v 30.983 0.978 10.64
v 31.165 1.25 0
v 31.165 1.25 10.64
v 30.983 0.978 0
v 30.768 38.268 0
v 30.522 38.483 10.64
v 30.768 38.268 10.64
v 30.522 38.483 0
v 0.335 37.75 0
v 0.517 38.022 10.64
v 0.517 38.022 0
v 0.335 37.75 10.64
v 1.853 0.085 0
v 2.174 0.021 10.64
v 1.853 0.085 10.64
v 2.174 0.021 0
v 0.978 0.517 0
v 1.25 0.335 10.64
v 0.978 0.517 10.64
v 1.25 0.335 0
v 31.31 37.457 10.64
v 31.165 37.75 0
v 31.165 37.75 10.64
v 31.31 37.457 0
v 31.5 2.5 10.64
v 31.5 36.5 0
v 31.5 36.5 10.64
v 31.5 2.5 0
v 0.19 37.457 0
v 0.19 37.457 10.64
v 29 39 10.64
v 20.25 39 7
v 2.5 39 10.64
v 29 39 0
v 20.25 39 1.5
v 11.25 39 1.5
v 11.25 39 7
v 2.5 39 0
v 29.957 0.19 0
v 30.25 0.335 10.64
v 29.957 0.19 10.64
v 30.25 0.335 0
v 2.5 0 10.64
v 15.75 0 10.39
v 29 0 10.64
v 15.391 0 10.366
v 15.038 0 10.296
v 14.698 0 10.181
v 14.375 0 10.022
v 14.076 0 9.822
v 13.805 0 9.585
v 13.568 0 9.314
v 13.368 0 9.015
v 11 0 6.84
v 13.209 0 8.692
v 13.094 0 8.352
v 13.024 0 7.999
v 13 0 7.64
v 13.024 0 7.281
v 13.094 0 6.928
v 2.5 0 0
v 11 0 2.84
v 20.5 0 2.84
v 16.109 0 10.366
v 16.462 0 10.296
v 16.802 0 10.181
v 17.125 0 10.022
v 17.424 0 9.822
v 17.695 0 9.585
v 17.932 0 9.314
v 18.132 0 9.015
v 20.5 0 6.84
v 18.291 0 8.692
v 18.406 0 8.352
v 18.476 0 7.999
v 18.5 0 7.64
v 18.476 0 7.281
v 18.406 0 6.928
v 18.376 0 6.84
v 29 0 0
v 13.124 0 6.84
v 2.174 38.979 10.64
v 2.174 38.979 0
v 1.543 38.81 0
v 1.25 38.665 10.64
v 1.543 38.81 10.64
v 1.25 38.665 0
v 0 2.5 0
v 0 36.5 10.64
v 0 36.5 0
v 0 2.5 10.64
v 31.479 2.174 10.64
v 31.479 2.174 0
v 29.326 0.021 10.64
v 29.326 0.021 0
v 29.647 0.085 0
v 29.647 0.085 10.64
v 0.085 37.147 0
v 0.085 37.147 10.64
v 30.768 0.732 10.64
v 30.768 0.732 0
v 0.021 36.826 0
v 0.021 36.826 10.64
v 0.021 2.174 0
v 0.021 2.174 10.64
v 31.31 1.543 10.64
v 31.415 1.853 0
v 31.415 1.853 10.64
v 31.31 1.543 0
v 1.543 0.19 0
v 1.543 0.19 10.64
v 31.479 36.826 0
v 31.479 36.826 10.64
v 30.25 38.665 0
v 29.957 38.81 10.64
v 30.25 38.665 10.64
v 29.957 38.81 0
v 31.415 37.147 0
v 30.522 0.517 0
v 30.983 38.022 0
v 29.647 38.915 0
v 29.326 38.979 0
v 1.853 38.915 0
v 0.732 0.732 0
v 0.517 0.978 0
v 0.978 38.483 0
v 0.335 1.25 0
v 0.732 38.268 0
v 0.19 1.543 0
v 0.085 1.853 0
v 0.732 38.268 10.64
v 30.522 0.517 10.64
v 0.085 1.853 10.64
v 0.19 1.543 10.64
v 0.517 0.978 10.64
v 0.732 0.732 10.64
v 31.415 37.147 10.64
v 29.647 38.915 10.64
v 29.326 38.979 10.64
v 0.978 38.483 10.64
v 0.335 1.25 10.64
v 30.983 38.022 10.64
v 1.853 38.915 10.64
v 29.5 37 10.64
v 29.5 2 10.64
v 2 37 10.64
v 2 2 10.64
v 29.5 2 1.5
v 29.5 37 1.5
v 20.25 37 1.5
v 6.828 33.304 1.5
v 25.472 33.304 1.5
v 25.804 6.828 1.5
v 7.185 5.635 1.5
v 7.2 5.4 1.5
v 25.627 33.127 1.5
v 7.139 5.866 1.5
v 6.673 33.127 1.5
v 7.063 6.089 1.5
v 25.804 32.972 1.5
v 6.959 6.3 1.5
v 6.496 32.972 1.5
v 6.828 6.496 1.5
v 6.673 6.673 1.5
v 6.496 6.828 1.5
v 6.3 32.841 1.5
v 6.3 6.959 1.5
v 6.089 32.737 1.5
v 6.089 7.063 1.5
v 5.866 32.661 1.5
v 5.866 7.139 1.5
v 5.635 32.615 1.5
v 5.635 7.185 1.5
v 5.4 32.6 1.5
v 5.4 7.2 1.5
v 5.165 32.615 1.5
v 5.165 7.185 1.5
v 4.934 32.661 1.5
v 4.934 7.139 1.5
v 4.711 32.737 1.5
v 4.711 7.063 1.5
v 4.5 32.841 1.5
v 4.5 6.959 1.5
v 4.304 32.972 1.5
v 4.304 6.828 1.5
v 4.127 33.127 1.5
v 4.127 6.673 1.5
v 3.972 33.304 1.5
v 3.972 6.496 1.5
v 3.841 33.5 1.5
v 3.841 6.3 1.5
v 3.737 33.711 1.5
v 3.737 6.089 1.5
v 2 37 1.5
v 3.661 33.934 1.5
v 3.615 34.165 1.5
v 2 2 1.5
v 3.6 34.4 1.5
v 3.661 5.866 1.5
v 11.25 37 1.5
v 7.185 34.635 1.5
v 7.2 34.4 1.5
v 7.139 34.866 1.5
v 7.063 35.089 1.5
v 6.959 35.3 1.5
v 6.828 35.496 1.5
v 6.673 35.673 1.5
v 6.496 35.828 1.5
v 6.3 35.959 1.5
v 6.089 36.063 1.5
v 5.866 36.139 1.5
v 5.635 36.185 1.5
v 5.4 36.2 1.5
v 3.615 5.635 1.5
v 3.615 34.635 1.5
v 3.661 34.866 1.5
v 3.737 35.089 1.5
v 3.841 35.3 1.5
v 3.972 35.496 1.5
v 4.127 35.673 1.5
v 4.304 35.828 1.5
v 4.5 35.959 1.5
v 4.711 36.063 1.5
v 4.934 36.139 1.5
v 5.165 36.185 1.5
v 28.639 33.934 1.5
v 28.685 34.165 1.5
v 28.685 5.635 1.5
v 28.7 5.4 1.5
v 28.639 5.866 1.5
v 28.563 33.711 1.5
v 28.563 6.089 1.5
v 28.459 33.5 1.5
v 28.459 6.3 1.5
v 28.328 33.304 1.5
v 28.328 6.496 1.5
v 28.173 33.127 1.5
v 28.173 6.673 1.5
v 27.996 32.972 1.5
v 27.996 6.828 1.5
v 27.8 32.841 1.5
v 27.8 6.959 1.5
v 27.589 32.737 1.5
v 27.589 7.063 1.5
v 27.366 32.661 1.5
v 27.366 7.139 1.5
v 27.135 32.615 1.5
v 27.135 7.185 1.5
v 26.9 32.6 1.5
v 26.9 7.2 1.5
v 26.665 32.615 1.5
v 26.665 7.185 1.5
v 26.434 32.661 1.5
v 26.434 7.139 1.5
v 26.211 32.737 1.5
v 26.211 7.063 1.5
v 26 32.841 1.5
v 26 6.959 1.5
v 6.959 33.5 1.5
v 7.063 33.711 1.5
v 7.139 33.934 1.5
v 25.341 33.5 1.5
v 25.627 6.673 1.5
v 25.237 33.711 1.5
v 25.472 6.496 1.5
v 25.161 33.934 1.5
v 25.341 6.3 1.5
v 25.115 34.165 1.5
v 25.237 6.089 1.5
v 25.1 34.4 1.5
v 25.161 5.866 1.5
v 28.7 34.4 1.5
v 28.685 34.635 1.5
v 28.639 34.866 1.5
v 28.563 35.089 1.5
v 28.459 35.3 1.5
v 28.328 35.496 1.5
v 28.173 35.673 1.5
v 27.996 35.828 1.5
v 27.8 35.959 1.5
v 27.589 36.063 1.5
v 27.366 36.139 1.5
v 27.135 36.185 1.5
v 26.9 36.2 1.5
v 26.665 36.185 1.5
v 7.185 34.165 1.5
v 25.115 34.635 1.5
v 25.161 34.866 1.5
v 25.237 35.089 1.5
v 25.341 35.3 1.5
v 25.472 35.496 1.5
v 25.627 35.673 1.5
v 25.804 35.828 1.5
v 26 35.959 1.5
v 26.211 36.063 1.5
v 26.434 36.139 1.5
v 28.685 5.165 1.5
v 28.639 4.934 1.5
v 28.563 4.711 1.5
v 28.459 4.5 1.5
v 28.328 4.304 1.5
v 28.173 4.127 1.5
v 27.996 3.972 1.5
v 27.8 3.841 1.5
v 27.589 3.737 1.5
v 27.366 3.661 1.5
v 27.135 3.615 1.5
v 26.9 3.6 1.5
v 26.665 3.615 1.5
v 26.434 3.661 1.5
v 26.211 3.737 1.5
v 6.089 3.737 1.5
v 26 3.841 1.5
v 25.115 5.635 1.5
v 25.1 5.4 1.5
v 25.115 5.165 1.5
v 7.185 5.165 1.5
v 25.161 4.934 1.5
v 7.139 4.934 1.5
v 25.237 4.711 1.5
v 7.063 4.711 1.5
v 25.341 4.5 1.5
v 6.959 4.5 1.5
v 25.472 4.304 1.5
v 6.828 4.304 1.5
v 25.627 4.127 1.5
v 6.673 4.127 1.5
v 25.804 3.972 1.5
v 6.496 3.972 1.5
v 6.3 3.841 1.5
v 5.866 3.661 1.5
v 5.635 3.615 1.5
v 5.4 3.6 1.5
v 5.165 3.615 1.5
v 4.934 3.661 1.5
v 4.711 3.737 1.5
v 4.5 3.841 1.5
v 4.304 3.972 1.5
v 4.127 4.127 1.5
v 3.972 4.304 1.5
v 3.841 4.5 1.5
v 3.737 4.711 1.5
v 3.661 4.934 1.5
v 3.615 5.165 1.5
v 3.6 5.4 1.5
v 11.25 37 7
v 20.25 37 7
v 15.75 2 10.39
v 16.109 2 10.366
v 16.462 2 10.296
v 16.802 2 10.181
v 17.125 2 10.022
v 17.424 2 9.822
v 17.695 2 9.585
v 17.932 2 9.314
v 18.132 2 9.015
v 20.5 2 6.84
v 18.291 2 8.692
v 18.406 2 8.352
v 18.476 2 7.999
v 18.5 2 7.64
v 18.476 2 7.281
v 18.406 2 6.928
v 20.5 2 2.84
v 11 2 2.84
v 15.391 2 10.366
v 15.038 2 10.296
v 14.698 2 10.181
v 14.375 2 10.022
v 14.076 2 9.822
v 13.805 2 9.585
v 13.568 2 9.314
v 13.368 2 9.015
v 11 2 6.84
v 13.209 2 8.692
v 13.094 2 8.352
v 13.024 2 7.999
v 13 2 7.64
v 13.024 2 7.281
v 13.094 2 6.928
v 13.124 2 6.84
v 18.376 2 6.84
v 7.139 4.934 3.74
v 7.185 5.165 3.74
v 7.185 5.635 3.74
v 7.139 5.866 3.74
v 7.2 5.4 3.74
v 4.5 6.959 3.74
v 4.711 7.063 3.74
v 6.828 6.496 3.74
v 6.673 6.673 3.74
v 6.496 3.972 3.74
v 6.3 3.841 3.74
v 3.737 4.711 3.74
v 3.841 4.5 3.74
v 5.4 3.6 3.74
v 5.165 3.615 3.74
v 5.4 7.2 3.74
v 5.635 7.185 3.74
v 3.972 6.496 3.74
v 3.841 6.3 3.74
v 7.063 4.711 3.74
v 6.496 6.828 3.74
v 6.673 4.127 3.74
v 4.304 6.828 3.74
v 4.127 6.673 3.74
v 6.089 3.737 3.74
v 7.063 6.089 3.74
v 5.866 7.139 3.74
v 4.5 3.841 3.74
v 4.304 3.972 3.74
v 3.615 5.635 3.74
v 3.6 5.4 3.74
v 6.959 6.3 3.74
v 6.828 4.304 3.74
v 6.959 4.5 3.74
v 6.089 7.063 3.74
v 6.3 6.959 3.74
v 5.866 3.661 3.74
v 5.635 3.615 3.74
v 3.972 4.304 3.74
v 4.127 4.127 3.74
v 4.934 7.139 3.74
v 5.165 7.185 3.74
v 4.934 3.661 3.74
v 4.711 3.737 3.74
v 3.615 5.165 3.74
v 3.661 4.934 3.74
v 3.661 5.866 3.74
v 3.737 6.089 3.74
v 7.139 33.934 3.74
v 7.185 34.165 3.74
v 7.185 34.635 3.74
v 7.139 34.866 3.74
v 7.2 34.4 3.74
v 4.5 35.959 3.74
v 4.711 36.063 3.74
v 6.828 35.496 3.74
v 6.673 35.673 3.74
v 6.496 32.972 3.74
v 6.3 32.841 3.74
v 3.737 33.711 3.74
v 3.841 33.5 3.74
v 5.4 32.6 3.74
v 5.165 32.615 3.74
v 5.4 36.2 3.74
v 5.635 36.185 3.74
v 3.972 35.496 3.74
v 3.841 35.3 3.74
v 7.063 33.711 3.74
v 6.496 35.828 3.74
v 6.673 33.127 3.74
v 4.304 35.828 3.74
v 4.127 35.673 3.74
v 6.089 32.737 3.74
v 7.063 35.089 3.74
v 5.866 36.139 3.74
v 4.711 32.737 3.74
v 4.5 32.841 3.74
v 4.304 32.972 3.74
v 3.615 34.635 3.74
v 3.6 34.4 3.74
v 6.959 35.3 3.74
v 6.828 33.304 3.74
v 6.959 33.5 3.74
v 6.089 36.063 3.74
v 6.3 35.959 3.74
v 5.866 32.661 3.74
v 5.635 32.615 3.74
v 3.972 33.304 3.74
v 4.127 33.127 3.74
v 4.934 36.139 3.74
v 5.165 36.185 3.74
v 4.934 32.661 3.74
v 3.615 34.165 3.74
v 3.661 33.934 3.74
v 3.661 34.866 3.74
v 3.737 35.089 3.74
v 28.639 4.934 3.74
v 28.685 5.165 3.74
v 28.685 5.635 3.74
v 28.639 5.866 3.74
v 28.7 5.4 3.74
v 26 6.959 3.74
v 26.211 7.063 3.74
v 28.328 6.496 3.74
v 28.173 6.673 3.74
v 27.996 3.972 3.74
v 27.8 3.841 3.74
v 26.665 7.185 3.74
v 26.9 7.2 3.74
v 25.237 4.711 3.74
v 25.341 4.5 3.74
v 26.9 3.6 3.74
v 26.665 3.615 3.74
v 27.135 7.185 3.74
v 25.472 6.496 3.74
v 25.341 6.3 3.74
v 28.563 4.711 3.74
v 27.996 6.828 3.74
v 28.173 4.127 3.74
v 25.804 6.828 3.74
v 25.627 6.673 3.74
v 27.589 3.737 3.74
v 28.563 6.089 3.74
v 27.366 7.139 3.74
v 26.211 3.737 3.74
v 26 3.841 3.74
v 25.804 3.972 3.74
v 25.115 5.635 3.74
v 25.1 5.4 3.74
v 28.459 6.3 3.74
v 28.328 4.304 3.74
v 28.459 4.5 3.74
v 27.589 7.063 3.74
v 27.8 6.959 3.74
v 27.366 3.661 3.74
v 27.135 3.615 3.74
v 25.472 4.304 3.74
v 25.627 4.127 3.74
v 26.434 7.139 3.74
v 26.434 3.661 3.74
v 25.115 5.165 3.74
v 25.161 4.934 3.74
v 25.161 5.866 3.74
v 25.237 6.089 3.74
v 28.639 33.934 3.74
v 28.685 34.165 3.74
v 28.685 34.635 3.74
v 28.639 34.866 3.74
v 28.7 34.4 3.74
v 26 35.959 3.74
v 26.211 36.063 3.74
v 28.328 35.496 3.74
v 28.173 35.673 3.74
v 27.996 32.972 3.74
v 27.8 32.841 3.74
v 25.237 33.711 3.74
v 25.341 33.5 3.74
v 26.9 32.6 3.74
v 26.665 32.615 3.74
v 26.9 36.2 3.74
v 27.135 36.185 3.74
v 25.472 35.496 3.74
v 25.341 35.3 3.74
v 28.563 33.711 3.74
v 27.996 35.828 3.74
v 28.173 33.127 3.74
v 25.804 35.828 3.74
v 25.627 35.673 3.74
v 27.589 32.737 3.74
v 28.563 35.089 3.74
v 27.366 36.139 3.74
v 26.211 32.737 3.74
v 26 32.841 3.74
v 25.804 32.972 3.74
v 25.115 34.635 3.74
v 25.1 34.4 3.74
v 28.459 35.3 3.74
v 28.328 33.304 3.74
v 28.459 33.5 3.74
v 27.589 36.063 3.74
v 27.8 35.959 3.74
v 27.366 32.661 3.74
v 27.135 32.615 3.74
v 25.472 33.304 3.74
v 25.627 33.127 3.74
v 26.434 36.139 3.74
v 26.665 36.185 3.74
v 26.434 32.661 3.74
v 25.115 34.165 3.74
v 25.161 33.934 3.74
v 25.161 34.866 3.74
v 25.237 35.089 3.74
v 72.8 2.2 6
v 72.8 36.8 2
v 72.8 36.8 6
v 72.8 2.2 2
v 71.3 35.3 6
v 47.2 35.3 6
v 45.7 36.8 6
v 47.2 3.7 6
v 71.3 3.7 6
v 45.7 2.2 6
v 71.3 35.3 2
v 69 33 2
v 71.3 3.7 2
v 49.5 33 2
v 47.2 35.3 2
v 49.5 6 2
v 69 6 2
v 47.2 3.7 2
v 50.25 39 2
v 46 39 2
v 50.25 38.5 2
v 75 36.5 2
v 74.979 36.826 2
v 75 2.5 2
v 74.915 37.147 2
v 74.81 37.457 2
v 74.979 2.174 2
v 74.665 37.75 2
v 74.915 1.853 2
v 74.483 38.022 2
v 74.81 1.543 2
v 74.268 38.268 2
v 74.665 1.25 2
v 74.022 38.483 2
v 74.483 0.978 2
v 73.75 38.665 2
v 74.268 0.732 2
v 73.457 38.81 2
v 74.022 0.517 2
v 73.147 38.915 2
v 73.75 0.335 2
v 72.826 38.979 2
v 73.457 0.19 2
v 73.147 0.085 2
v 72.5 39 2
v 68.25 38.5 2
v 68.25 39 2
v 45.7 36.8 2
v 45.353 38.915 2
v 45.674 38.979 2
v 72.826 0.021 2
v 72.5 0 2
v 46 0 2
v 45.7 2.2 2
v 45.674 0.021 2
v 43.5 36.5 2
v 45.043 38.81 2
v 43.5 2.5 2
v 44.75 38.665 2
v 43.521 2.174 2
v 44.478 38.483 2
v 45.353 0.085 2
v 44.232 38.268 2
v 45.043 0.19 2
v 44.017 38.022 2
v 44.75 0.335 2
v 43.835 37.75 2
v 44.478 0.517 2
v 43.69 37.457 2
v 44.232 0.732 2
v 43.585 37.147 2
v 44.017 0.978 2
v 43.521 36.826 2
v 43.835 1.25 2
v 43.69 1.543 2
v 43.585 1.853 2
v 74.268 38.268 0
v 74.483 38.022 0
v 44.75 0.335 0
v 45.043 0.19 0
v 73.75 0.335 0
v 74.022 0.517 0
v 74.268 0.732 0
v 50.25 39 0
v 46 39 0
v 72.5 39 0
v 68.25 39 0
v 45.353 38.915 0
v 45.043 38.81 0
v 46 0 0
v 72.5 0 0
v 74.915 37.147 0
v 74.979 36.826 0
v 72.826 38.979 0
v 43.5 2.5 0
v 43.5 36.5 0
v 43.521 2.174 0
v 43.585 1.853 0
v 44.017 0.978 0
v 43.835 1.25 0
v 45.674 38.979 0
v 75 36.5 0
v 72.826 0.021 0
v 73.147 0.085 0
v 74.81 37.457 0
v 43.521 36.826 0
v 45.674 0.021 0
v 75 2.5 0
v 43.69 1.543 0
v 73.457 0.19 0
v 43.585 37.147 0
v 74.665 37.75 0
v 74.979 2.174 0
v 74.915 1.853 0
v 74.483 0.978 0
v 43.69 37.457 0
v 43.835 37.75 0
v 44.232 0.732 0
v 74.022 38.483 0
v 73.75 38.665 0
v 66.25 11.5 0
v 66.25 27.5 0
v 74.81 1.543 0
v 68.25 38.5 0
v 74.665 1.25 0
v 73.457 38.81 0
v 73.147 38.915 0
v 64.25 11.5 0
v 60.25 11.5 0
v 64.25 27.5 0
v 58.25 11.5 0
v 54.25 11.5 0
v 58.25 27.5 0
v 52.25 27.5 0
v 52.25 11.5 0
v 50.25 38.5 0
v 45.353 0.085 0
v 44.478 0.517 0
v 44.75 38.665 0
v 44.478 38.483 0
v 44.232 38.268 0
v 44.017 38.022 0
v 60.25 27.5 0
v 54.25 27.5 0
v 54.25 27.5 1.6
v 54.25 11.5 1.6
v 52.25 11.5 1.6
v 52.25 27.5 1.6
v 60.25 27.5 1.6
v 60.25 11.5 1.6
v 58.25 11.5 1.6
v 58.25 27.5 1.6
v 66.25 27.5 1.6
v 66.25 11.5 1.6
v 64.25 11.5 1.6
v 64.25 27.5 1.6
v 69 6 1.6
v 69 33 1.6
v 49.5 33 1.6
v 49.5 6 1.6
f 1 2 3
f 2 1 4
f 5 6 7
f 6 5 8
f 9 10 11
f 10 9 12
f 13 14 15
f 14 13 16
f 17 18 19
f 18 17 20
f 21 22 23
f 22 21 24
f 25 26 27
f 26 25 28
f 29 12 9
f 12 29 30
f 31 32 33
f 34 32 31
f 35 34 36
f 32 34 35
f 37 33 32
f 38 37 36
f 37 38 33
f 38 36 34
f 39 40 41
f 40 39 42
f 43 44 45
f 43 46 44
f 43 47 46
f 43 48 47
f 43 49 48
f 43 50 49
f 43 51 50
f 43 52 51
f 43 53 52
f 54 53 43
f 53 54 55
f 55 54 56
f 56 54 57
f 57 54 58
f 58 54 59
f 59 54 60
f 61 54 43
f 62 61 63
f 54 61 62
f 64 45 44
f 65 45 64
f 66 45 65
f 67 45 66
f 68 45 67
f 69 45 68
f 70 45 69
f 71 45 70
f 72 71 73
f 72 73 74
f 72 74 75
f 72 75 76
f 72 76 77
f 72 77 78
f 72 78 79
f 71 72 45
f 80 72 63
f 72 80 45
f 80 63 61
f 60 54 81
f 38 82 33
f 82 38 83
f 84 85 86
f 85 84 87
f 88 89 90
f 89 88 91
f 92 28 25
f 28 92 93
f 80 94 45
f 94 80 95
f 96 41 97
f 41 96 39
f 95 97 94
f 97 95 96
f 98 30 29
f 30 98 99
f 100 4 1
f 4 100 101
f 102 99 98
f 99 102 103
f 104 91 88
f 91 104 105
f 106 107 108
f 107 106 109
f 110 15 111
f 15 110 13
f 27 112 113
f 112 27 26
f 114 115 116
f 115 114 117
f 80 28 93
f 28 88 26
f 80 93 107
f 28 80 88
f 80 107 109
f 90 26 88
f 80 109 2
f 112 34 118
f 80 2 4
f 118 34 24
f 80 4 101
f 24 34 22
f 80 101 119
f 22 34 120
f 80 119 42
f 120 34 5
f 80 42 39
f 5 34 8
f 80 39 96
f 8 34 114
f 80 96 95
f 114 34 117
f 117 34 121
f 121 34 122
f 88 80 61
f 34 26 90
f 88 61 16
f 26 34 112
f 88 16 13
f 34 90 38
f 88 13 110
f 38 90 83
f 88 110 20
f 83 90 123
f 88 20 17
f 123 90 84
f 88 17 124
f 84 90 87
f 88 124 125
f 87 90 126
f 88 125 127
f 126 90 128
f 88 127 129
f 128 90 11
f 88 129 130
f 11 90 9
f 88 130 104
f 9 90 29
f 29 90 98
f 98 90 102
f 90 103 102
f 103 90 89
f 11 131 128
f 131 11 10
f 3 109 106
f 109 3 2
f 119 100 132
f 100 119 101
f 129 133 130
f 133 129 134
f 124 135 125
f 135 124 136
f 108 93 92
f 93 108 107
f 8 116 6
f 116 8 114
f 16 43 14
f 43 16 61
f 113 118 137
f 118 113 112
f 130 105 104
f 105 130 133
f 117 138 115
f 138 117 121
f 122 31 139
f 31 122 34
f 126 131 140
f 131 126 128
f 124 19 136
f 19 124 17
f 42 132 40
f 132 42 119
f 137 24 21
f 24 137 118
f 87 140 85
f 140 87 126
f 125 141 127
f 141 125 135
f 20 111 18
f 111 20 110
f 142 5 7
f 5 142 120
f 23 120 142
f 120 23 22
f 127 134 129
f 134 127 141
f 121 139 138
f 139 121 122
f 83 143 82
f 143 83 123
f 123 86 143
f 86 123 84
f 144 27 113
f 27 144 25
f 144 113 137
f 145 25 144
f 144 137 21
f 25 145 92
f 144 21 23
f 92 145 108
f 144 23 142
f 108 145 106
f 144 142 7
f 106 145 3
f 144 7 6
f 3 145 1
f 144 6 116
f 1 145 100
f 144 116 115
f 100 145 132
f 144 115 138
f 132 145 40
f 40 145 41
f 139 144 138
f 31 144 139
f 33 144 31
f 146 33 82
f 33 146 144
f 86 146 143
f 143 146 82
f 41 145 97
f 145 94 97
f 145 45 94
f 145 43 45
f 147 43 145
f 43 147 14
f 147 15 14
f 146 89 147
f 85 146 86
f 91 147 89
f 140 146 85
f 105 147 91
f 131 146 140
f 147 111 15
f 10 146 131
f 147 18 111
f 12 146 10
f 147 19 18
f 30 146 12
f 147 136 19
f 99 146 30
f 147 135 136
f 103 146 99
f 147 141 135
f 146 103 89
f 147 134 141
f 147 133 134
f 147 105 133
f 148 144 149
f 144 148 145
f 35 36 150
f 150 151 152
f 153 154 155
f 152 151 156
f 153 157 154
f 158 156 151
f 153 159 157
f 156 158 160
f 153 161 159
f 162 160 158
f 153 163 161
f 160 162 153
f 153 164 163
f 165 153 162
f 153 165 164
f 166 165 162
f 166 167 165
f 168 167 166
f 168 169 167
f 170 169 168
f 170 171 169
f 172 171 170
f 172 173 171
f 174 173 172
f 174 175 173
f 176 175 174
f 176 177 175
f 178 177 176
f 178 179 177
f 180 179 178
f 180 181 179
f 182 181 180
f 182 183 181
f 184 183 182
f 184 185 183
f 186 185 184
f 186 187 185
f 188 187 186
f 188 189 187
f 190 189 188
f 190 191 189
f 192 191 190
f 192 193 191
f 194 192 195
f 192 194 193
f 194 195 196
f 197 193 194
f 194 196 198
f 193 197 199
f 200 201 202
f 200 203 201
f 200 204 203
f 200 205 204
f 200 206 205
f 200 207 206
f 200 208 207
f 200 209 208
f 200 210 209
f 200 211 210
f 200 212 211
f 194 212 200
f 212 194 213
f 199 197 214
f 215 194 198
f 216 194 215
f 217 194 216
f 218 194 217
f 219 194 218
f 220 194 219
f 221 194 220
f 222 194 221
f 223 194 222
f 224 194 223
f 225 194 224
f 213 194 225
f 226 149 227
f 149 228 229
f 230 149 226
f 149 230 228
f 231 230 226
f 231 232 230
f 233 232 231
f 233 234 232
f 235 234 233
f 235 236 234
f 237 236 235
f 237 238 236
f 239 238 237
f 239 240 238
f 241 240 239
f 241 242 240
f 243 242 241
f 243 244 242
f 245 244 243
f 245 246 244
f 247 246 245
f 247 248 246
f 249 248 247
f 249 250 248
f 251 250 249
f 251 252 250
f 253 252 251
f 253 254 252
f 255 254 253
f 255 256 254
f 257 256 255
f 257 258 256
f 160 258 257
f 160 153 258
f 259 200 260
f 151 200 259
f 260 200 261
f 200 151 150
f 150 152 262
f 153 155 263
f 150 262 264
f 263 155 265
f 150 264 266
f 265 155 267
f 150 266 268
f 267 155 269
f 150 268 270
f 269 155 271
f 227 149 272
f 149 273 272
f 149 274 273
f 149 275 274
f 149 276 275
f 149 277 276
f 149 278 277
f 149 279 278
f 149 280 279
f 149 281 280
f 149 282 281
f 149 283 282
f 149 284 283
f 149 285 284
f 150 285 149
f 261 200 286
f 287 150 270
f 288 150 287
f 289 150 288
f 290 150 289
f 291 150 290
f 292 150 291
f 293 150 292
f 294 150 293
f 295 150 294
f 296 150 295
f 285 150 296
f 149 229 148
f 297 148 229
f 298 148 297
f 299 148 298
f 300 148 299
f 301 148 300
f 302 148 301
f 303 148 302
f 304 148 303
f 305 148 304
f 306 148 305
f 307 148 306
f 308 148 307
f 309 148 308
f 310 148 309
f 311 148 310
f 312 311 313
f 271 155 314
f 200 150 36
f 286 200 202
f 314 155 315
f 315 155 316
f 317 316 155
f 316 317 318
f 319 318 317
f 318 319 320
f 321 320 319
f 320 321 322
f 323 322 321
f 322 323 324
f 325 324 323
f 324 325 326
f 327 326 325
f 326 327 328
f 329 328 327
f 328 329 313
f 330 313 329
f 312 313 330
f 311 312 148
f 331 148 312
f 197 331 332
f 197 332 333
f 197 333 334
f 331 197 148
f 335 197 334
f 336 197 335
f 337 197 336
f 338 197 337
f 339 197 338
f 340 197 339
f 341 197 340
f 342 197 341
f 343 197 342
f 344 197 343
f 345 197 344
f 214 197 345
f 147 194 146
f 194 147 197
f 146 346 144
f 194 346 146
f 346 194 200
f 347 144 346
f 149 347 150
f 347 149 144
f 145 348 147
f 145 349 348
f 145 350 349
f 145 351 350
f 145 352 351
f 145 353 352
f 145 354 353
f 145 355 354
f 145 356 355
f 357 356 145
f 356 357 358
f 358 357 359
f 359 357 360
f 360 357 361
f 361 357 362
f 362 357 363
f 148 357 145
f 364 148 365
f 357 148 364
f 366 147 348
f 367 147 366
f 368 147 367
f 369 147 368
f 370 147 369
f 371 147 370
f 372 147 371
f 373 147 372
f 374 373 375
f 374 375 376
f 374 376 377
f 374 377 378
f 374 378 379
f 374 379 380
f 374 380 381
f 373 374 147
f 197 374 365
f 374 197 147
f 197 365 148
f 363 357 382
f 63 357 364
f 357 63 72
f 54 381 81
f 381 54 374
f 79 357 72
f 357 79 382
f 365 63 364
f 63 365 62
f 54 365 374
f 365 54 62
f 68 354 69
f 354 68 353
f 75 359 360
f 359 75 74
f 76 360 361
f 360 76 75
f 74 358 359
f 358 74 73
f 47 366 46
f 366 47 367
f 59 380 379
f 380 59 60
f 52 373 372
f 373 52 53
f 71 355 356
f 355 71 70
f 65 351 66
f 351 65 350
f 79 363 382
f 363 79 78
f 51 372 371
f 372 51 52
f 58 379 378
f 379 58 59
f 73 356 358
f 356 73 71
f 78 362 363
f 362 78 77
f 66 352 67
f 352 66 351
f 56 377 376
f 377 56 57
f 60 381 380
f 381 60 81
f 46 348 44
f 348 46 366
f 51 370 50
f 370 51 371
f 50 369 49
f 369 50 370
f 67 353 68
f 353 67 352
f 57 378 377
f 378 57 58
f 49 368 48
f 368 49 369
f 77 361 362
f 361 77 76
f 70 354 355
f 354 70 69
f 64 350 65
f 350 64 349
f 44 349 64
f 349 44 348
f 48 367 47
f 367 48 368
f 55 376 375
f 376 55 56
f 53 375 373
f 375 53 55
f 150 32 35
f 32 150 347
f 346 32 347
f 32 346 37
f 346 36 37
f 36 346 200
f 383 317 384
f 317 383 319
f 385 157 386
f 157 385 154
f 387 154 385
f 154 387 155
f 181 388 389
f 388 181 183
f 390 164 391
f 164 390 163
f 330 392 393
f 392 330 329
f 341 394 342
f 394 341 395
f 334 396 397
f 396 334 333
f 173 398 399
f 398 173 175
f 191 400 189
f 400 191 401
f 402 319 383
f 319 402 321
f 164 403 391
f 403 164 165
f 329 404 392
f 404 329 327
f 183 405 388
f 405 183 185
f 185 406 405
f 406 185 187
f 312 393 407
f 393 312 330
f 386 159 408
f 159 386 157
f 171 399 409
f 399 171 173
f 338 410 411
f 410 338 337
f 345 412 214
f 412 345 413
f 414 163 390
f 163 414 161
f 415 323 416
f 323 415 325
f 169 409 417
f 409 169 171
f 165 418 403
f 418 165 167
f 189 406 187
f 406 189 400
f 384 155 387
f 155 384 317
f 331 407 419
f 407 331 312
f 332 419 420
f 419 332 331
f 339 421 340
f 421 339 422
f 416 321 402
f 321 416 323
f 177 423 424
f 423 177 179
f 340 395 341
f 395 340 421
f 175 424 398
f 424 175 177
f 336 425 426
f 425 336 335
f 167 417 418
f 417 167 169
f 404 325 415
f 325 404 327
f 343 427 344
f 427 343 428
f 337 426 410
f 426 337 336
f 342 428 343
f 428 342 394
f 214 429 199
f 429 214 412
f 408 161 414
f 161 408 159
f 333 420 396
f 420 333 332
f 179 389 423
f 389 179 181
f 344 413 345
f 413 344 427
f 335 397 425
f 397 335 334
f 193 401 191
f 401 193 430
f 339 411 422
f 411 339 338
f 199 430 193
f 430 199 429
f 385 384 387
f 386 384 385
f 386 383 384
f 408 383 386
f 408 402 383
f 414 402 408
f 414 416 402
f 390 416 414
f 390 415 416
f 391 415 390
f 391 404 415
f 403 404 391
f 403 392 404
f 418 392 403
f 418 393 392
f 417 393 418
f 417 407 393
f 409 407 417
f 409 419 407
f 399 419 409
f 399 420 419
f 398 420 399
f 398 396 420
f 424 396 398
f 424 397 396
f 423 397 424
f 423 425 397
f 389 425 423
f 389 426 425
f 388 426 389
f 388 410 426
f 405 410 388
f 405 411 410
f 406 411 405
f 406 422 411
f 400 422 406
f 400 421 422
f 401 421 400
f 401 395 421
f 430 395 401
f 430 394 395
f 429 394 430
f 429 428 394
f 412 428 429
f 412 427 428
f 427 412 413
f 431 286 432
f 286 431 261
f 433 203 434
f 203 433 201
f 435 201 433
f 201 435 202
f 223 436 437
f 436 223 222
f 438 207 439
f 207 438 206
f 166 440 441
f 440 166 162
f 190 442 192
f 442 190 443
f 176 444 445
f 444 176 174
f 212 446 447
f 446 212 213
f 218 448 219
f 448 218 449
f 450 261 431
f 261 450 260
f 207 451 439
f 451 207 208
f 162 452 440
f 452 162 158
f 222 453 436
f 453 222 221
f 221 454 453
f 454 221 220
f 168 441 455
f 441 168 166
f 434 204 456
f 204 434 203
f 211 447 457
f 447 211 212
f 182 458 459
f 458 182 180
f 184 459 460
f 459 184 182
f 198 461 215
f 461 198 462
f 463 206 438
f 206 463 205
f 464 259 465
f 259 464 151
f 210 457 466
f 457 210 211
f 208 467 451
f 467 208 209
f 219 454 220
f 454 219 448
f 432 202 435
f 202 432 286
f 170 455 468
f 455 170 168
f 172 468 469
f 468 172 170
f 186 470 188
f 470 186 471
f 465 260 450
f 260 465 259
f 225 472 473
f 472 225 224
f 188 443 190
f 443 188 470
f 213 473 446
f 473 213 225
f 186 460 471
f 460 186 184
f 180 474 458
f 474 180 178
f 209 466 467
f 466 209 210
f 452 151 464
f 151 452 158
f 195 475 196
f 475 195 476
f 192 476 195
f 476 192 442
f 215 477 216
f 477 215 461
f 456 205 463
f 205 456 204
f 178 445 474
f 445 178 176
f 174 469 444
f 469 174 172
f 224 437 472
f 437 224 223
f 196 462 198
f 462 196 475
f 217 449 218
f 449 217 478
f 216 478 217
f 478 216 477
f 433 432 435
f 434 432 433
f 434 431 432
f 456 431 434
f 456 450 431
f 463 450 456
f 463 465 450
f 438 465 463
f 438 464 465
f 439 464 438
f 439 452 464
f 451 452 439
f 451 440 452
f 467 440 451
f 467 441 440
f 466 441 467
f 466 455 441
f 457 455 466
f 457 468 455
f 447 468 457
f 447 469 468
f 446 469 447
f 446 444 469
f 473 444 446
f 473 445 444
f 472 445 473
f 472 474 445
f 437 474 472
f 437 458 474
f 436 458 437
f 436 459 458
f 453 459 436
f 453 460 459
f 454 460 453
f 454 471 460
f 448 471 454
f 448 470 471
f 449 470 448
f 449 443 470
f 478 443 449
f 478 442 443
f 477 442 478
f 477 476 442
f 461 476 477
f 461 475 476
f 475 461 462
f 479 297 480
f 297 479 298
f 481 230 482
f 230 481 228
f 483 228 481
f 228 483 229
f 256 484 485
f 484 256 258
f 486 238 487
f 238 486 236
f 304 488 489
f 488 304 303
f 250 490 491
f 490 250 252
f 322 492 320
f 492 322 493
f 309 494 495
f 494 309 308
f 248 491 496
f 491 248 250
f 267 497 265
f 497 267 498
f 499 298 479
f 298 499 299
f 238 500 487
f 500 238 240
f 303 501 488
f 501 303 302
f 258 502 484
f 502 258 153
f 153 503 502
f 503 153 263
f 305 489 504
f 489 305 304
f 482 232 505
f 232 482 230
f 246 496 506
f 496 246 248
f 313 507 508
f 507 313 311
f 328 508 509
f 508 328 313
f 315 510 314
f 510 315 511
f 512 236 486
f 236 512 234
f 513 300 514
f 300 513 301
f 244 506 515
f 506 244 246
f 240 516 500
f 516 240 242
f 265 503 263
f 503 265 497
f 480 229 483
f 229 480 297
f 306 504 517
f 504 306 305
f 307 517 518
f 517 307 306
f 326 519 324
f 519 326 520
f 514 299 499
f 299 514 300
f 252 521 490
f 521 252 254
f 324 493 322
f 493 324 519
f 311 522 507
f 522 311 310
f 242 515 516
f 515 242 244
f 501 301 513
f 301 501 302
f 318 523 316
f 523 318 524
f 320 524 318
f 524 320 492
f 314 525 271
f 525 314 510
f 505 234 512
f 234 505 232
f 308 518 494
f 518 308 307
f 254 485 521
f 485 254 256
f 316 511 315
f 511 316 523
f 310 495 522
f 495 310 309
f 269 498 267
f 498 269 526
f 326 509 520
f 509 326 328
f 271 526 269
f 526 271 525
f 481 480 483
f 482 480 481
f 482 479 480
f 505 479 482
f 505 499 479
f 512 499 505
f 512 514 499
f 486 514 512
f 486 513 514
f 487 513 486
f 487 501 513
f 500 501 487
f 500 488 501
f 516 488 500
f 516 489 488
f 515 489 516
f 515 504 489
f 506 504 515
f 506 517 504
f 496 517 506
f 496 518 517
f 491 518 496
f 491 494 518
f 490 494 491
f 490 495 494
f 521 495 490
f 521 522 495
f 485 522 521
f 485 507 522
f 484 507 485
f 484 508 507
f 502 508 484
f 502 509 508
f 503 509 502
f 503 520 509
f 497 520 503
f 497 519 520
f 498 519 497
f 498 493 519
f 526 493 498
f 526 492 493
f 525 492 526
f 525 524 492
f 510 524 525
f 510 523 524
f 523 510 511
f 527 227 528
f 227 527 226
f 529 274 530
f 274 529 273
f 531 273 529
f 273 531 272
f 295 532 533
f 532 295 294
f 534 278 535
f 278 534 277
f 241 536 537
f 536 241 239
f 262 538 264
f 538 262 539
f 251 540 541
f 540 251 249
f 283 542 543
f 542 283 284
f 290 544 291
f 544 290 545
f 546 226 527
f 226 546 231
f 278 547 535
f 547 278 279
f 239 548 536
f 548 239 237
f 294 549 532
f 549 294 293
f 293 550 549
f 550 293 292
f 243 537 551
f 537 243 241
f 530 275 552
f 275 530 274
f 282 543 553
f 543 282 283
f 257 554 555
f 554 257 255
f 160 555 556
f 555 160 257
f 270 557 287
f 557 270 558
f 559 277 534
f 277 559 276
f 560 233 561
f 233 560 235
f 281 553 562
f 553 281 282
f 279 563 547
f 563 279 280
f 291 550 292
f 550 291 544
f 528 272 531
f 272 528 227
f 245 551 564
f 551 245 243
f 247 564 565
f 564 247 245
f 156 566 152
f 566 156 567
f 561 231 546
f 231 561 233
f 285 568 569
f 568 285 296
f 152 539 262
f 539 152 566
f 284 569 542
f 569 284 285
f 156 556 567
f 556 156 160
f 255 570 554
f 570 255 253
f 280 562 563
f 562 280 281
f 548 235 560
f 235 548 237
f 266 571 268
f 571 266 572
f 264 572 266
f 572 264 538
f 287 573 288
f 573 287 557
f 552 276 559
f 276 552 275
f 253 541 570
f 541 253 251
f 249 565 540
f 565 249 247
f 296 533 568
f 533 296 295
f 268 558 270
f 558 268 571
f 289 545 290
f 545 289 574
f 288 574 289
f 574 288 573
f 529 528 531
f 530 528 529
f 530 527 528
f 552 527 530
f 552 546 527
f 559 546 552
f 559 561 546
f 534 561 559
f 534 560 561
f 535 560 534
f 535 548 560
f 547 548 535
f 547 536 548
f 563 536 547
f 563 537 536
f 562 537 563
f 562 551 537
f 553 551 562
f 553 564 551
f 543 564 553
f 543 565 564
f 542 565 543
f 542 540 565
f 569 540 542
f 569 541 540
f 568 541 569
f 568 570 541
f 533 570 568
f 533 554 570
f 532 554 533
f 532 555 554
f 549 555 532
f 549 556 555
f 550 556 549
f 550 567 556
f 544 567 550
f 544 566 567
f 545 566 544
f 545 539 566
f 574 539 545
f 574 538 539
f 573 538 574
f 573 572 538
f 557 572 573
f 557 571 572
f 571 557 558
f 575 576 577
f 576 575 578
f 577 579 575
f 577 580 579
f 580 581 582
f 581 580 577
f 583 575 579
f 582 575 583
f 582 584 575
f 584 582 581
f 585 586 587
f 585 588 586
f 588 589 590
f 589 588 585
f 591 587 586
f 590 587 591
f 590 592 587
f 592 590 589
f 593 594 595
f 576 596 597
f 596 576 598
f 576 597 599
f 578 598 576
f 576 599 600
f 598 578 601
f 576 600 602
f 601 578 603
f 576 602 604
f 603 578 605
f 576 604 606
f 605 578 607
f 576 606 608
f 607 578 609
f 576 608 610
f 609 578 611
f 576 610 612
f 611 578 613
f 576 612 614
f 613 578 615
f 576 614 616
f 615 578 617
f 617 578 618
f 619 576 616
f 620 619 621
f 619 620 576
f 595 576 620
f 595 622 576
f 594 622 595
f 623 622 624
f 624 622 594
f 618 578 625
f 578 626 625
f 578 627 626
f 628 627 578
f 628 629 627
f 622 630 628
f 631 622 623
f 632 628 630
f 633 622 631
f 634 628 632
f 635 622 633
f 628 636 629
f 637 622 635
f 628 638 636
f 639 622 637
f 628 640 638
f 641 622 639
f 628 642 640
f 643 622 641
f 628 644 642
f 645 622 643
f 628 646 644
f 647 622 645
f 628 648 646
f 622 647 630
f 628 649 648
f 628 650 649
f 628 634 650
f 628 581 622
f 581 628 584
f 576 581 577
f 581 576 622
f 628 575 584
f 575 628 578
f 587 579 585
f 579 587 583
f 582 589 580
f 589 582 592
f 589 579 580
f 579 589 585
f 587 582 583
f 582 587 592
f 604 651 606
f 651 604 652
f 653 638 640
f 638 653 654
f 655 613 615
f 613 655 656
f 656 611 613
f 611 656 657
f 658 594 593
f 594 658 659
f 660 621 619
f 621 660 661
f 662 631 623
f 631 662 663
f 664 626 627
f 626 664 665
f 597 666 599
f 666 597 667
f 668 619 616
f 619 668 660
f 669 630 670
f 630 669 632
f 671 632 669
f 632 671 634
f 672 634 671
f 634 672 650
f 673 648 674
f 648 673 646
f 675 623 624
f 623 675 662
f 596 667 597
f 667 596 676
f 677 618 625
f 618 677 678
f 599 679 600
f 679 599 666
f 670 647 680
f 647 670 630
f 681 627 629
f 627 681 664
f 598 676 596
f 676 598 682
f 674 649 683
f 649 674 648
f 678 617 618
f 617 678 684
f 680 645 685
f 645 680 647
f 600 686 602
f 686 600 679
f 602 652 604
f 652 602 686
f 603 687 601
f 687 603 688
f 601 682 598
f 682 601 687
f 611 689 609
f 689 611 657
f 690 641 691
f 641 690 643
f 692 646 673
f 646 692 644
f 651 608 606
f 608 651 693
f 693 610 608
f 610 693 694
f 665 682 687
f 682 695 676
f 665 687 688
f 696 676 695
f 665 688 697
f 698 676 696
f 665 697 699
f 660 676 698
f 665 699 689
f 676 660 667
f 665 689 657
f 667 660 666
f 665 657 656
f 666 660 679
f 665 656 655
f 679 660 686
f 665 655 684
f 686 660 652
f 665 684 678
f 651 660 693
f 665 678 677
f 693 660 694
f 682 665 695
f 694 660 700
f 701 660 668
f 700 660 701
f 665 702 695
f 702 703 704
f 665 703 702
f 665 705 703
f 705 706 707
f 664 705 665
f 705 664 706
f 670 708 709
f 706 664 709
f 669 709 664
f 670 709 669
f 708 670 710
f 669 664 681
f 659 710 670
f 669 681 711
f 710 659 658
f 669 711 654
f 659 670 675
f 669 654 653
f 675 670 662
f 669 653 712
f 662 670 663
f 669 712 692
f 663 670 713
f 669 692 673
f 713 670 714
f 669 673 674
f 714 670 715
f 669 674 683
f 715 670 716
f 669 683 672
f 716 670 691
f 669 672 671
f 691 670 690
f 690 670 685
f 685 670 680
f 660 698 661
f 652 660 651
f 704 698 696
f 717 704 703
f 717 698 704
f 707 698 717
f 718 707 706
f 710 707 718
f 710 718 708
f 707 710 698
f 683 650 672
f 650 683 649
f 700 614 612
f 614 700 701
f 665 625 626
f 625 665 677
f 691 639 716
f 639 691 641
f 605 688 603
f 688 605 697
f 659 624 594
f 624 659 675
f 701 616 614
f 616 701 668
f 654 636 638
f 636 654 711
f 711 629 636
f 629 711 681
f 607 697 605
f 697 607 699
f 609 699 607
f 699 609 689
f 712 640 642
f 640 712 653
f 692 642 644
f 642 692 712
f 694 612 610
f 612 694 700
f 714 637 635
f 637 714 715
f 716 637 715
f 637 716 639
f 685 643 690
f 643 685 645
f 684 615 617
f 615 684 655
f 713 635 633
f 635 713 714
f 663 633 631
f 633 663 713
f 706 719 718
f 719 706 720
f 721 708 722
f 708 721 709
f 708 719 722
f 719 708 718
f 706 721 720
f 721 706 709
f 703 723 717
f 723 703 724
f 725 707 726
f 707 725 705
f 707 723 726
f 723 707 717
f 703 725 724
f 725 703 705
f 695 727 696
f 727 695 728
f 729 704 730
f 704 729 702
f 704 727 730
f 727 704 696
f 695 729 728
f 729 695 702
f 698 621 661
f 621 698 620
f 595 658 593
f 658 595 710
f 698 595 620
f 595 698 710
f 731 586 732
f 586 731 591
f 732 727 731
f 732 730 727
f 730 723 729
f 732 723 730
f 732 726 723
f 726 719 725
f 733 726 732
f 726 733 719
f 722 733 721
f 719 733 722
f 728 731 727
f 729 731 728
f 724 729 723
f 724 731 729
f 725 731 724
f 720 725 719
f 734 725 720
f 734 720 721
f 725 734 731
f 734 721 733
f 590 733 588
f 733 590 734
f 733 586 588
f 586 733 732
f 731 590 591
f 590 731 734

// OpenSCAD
// =============================================================================
//  PixMob IR Controller — Gehäuse
//  Wemos D1 Mini (USB Type-C) + KY-005 IR-Sender
//
//  Zweiteiler: Tray (Unterteil) + Lid (Deckel, Reibschluss)
//  Druckbar OHNE Stützen — beide Teile flach auf Druckbett
//
//  Vorderseite (Y=0):
//    [unten] USB Type-C Buchse
//    [oben]  IR-LED Loch (5 mm LED bündig einpressen)
//
//  Kabelkanal (Rückseite Y=ol):
//    Für KY-005 Anschlussleitungen (S / VCC / GND)
//
//  Druck-Empfehlung:
//    Material : PETG oder PLA
//    Schicht  : 0.2 mm
//    Füllung  : 20 %
//    Wände    : 3
// =============================================================================

/* [1 — Platinen-Maße  D1 Mini] */
bw      = 26.7;   // Breite  [mm]
bl      = 34.2;   // Länge   [mm]
bt      = 1.6;    // PCB-Dicke
pin_h   = 2.54;   // Pin-Header Höhe unter PCB
comp_h  = 3.5;    // Bauteil-Höhe über PCB (ESP8266-Modul ≈ 3 mm)

/* [2 — USB Type-C Ausschnitt] */
usb_w   = 9.5;    // Breite  (Type-C Standard 8.94 + 0.6 Spiel)
usb_h   = 4.0;    // Höhe    (Type-C Standard 3.26 + 0.7 Spiel)

/* [3 — IR-LED Loch (Vorderwand)] */
ir_d    = 5.5;    // Durchmesser (5 mm LED-Körper + 0.5 Presspassung)

/* [4 — KY-005 Kabelkanal (Rückwand)] */
cable_w = 9.0;
cable_h = 5.5;

/* [5 — Gehäuse] */
wall    = 2.0;    // Wandstärke
floor_t = 1.5;    // Bodenstärke
gap     = 0.4;    // Spiel Board ↔ Wand (rundum)
box_r   = 2.5;    // Eckabrundungsradius

/* [6 — Deckel (Reibschluss)] */
lid_t   = 2.0;    // Deckelplatten-Stärke
rim_h   = 4.0;    // Krempen-Höhe (steckt in Tray)
rim_w   = 1.5;    // Krempen-Wandstärke
fit     = 0.20;   // Reibschluss-Spiel (reduzieren → straffer, erhöhen → lockerer)

/* [7 — Render-Qualität] */
$fn     = 48;


// =============================================================================
// Berechnete Maße (nicht ändern)
// =============================================================================
iw   = bw + 2*gap;                          // Innenbreite
il   = bl + 2*gap;                          // Innenlänge
ih   = pin_h + bt + comp_h + 1.5;          // Innenhöhe
ow   = iw + 2*wall;                         // Außenbreite
ol   = il + 2*wall;                         // Außenlänge
oh   = floor_t + ih;                        // Tray Gesamthöhe

// USB-Loch: vertikal auf Mitte des PCB-Steckerkontakts
usb_z  = floor_t + pin_h + bt/2 - usb_h/2;

// IR-LED Loch: 3 mm unter Oberkante
ir_cz  = oh - 3.0;


// =============================================================================
// Hilfsfunktion: abgerundeter Quader
// =============================================================================
module rbox(x, y, z, r = box_r) {
    hull()
        for (xi = [r, x - r], yi = [r, y - r])
            translate([xi, yi, 0])
                cylinder(r = r, h = z);
}


// =============================================================================
// TRAY — Unterteil
// =============================================================================
module tray() {
    difference() {
        // Außenkörper
        rbox(ow, ol, oh);

        // Innenraum (oben offen)
        translate([wall, wall, floor_t])
            cube([iw, il, ih + 0.1]);

        // ── USB Type-C ── Vorderwand (y = 0)
        translate([ow/2 - usb_w/2,  -0.1,  usb_z])
            cube([usb_w,  wall + 0.2,  usb_h]);

        // ── IR-LED Loch ── Vorderwand, oben
        //    Zylinder-Achse liegt in Y-Richtung durch Vorderwand
        translate([ow/2,  wall + 0.1,  ir_cz])
            rotate([90, 0, 0])
                cylinder(d = ir_d,  h = wall + 0.2);

        // ── Kabelkanal ── Rückwand (y = ol)
        translate([ow/2 - cable_w/2,  ol - wall - 0.1,  floor_t])
            cube([cable_w,  wall + 0.2,  cable_h]);
    }

    // Board-Auflagepfosten: heben PCB an, sodass Pins frei hängen
    pr = 1.8;
    ph = pin_h - 0.3;   // etwas kürzer → PCB liegt satt auf
    for (xi = [wall + gap + 3,   wall + gap + iw - 3])
        for (yi = [wall + gap + 3,   wall + gap + il - 3])
            translate([xi, yi, floor_t])
                cylinder(r = pr, h = ph);
}


// =============================================================================
// LID — Deckel
// Druckposition: Außenfläche unten (glatte Oberfläche), Krempe zeigt nach oben
// Zum Aufsetzen: umdrehen und in Tray eindrücken
// =============================================================================
module lid() {
    difference() {
        union() {
            // Deckelfläche
            rbox(ow, ol, lid_t);

            // Innenkrempe (Reibschluss — ragt in Tray-Öffnung)
            translate([wall + fit,  wall + fit,  lid_t])
                difference() {
                    cube([iw - 2*fit,  il - 2*fit,  rim_h]);
                    translate([rim_w,  rim_w,  -0.1])
                        cube([iw - 2*fit - 2*rim_w,
                              il - 2*fit - 2*rim_w,
                              rim_h + 0.2]);
                }
        }

        // Lüftungsschlitze (3 Stück, Mitte Deckel)
        for (xi = [-6, 0, 6])
            translate([ow/2 + xi - 1,  ol/2 - 8,  -0.1])
                cube([2, 16, lid_t + 0.2]);

        // Daumen-Kerbe zum Öffnen (Rückseite)
        translate([ow/2 - 9,  ol - 0.5,  -0.1])
            cube([18, 2, lid_t + 0.2]);

        // Versenktes Label-Feld (Gravur / Beschriftung)
        translate([wall + 4,  wall + 4,  lid_t - 0.4])
            cube([ow - 2*wall - 8,  ol - 2*wall - 8,  0.5]);
    }
}


// =============================================================================
// AUSGABE
// Beide Teile nebeneinander — direkt für Slicer exportieren
// =============================================================================

// ── Tray ──
color("SteelBlue", 0.95)
    tray();

// ── Deckel  (versetzt, Krempe zeigt nach oben — so drucken) ──
color("DodgerBlue", 0.95)
    translate([ow + 12,  0,  0])
        lid();


// =============================================================================
// Zusammengesetzt  (zum Prüfen — Kommentarzeichen entfernen)
// =============================================================================
// color("SteelBlue")
//     tray();
// color("DodgerBlue", 0.5)
//     translate([0, 0, oh + lid_t + rim_h])
//         rotate([180, 0, 0])
//             translate([0, -ol, 0])
//                 lid();


// =============================================================================
// MONTAGEANLEITUNG
// =============================================================================
// 1. Beide Teile drucken (keine Stützen nötig)
// 2. Wemos D1 Mini auf die Auflagepfosten setzen
//    → USB-C Buchse zeigt zur Vorderwand (y=0)
// 3. KY-005 IR-Sender:
//    a) LED-Körper von innen in das 5-mm-Loch der Vorderwand drücken
//       (Presspassung — ggf. leicht nachfeilen oder Heißkleber)
//    b) 3 Leitungen (S→D2, VCC→3V3, GND→GND) an D1 Mini anlöten
//    c) KY-005 PCB (klein, ~15×18 mm) kann im Innenraum liegen
// 4. Deckel umdrehen und eindrücken (Krempe rastet im Tray ein)
//    → Zum Öffnen: Daumen in Kerbe (Rückseite), Deckel abziehen
// 5. Optional: Micro-Kreuzschlitz-Schraube M2×8 durch Deckelmitte sichern
